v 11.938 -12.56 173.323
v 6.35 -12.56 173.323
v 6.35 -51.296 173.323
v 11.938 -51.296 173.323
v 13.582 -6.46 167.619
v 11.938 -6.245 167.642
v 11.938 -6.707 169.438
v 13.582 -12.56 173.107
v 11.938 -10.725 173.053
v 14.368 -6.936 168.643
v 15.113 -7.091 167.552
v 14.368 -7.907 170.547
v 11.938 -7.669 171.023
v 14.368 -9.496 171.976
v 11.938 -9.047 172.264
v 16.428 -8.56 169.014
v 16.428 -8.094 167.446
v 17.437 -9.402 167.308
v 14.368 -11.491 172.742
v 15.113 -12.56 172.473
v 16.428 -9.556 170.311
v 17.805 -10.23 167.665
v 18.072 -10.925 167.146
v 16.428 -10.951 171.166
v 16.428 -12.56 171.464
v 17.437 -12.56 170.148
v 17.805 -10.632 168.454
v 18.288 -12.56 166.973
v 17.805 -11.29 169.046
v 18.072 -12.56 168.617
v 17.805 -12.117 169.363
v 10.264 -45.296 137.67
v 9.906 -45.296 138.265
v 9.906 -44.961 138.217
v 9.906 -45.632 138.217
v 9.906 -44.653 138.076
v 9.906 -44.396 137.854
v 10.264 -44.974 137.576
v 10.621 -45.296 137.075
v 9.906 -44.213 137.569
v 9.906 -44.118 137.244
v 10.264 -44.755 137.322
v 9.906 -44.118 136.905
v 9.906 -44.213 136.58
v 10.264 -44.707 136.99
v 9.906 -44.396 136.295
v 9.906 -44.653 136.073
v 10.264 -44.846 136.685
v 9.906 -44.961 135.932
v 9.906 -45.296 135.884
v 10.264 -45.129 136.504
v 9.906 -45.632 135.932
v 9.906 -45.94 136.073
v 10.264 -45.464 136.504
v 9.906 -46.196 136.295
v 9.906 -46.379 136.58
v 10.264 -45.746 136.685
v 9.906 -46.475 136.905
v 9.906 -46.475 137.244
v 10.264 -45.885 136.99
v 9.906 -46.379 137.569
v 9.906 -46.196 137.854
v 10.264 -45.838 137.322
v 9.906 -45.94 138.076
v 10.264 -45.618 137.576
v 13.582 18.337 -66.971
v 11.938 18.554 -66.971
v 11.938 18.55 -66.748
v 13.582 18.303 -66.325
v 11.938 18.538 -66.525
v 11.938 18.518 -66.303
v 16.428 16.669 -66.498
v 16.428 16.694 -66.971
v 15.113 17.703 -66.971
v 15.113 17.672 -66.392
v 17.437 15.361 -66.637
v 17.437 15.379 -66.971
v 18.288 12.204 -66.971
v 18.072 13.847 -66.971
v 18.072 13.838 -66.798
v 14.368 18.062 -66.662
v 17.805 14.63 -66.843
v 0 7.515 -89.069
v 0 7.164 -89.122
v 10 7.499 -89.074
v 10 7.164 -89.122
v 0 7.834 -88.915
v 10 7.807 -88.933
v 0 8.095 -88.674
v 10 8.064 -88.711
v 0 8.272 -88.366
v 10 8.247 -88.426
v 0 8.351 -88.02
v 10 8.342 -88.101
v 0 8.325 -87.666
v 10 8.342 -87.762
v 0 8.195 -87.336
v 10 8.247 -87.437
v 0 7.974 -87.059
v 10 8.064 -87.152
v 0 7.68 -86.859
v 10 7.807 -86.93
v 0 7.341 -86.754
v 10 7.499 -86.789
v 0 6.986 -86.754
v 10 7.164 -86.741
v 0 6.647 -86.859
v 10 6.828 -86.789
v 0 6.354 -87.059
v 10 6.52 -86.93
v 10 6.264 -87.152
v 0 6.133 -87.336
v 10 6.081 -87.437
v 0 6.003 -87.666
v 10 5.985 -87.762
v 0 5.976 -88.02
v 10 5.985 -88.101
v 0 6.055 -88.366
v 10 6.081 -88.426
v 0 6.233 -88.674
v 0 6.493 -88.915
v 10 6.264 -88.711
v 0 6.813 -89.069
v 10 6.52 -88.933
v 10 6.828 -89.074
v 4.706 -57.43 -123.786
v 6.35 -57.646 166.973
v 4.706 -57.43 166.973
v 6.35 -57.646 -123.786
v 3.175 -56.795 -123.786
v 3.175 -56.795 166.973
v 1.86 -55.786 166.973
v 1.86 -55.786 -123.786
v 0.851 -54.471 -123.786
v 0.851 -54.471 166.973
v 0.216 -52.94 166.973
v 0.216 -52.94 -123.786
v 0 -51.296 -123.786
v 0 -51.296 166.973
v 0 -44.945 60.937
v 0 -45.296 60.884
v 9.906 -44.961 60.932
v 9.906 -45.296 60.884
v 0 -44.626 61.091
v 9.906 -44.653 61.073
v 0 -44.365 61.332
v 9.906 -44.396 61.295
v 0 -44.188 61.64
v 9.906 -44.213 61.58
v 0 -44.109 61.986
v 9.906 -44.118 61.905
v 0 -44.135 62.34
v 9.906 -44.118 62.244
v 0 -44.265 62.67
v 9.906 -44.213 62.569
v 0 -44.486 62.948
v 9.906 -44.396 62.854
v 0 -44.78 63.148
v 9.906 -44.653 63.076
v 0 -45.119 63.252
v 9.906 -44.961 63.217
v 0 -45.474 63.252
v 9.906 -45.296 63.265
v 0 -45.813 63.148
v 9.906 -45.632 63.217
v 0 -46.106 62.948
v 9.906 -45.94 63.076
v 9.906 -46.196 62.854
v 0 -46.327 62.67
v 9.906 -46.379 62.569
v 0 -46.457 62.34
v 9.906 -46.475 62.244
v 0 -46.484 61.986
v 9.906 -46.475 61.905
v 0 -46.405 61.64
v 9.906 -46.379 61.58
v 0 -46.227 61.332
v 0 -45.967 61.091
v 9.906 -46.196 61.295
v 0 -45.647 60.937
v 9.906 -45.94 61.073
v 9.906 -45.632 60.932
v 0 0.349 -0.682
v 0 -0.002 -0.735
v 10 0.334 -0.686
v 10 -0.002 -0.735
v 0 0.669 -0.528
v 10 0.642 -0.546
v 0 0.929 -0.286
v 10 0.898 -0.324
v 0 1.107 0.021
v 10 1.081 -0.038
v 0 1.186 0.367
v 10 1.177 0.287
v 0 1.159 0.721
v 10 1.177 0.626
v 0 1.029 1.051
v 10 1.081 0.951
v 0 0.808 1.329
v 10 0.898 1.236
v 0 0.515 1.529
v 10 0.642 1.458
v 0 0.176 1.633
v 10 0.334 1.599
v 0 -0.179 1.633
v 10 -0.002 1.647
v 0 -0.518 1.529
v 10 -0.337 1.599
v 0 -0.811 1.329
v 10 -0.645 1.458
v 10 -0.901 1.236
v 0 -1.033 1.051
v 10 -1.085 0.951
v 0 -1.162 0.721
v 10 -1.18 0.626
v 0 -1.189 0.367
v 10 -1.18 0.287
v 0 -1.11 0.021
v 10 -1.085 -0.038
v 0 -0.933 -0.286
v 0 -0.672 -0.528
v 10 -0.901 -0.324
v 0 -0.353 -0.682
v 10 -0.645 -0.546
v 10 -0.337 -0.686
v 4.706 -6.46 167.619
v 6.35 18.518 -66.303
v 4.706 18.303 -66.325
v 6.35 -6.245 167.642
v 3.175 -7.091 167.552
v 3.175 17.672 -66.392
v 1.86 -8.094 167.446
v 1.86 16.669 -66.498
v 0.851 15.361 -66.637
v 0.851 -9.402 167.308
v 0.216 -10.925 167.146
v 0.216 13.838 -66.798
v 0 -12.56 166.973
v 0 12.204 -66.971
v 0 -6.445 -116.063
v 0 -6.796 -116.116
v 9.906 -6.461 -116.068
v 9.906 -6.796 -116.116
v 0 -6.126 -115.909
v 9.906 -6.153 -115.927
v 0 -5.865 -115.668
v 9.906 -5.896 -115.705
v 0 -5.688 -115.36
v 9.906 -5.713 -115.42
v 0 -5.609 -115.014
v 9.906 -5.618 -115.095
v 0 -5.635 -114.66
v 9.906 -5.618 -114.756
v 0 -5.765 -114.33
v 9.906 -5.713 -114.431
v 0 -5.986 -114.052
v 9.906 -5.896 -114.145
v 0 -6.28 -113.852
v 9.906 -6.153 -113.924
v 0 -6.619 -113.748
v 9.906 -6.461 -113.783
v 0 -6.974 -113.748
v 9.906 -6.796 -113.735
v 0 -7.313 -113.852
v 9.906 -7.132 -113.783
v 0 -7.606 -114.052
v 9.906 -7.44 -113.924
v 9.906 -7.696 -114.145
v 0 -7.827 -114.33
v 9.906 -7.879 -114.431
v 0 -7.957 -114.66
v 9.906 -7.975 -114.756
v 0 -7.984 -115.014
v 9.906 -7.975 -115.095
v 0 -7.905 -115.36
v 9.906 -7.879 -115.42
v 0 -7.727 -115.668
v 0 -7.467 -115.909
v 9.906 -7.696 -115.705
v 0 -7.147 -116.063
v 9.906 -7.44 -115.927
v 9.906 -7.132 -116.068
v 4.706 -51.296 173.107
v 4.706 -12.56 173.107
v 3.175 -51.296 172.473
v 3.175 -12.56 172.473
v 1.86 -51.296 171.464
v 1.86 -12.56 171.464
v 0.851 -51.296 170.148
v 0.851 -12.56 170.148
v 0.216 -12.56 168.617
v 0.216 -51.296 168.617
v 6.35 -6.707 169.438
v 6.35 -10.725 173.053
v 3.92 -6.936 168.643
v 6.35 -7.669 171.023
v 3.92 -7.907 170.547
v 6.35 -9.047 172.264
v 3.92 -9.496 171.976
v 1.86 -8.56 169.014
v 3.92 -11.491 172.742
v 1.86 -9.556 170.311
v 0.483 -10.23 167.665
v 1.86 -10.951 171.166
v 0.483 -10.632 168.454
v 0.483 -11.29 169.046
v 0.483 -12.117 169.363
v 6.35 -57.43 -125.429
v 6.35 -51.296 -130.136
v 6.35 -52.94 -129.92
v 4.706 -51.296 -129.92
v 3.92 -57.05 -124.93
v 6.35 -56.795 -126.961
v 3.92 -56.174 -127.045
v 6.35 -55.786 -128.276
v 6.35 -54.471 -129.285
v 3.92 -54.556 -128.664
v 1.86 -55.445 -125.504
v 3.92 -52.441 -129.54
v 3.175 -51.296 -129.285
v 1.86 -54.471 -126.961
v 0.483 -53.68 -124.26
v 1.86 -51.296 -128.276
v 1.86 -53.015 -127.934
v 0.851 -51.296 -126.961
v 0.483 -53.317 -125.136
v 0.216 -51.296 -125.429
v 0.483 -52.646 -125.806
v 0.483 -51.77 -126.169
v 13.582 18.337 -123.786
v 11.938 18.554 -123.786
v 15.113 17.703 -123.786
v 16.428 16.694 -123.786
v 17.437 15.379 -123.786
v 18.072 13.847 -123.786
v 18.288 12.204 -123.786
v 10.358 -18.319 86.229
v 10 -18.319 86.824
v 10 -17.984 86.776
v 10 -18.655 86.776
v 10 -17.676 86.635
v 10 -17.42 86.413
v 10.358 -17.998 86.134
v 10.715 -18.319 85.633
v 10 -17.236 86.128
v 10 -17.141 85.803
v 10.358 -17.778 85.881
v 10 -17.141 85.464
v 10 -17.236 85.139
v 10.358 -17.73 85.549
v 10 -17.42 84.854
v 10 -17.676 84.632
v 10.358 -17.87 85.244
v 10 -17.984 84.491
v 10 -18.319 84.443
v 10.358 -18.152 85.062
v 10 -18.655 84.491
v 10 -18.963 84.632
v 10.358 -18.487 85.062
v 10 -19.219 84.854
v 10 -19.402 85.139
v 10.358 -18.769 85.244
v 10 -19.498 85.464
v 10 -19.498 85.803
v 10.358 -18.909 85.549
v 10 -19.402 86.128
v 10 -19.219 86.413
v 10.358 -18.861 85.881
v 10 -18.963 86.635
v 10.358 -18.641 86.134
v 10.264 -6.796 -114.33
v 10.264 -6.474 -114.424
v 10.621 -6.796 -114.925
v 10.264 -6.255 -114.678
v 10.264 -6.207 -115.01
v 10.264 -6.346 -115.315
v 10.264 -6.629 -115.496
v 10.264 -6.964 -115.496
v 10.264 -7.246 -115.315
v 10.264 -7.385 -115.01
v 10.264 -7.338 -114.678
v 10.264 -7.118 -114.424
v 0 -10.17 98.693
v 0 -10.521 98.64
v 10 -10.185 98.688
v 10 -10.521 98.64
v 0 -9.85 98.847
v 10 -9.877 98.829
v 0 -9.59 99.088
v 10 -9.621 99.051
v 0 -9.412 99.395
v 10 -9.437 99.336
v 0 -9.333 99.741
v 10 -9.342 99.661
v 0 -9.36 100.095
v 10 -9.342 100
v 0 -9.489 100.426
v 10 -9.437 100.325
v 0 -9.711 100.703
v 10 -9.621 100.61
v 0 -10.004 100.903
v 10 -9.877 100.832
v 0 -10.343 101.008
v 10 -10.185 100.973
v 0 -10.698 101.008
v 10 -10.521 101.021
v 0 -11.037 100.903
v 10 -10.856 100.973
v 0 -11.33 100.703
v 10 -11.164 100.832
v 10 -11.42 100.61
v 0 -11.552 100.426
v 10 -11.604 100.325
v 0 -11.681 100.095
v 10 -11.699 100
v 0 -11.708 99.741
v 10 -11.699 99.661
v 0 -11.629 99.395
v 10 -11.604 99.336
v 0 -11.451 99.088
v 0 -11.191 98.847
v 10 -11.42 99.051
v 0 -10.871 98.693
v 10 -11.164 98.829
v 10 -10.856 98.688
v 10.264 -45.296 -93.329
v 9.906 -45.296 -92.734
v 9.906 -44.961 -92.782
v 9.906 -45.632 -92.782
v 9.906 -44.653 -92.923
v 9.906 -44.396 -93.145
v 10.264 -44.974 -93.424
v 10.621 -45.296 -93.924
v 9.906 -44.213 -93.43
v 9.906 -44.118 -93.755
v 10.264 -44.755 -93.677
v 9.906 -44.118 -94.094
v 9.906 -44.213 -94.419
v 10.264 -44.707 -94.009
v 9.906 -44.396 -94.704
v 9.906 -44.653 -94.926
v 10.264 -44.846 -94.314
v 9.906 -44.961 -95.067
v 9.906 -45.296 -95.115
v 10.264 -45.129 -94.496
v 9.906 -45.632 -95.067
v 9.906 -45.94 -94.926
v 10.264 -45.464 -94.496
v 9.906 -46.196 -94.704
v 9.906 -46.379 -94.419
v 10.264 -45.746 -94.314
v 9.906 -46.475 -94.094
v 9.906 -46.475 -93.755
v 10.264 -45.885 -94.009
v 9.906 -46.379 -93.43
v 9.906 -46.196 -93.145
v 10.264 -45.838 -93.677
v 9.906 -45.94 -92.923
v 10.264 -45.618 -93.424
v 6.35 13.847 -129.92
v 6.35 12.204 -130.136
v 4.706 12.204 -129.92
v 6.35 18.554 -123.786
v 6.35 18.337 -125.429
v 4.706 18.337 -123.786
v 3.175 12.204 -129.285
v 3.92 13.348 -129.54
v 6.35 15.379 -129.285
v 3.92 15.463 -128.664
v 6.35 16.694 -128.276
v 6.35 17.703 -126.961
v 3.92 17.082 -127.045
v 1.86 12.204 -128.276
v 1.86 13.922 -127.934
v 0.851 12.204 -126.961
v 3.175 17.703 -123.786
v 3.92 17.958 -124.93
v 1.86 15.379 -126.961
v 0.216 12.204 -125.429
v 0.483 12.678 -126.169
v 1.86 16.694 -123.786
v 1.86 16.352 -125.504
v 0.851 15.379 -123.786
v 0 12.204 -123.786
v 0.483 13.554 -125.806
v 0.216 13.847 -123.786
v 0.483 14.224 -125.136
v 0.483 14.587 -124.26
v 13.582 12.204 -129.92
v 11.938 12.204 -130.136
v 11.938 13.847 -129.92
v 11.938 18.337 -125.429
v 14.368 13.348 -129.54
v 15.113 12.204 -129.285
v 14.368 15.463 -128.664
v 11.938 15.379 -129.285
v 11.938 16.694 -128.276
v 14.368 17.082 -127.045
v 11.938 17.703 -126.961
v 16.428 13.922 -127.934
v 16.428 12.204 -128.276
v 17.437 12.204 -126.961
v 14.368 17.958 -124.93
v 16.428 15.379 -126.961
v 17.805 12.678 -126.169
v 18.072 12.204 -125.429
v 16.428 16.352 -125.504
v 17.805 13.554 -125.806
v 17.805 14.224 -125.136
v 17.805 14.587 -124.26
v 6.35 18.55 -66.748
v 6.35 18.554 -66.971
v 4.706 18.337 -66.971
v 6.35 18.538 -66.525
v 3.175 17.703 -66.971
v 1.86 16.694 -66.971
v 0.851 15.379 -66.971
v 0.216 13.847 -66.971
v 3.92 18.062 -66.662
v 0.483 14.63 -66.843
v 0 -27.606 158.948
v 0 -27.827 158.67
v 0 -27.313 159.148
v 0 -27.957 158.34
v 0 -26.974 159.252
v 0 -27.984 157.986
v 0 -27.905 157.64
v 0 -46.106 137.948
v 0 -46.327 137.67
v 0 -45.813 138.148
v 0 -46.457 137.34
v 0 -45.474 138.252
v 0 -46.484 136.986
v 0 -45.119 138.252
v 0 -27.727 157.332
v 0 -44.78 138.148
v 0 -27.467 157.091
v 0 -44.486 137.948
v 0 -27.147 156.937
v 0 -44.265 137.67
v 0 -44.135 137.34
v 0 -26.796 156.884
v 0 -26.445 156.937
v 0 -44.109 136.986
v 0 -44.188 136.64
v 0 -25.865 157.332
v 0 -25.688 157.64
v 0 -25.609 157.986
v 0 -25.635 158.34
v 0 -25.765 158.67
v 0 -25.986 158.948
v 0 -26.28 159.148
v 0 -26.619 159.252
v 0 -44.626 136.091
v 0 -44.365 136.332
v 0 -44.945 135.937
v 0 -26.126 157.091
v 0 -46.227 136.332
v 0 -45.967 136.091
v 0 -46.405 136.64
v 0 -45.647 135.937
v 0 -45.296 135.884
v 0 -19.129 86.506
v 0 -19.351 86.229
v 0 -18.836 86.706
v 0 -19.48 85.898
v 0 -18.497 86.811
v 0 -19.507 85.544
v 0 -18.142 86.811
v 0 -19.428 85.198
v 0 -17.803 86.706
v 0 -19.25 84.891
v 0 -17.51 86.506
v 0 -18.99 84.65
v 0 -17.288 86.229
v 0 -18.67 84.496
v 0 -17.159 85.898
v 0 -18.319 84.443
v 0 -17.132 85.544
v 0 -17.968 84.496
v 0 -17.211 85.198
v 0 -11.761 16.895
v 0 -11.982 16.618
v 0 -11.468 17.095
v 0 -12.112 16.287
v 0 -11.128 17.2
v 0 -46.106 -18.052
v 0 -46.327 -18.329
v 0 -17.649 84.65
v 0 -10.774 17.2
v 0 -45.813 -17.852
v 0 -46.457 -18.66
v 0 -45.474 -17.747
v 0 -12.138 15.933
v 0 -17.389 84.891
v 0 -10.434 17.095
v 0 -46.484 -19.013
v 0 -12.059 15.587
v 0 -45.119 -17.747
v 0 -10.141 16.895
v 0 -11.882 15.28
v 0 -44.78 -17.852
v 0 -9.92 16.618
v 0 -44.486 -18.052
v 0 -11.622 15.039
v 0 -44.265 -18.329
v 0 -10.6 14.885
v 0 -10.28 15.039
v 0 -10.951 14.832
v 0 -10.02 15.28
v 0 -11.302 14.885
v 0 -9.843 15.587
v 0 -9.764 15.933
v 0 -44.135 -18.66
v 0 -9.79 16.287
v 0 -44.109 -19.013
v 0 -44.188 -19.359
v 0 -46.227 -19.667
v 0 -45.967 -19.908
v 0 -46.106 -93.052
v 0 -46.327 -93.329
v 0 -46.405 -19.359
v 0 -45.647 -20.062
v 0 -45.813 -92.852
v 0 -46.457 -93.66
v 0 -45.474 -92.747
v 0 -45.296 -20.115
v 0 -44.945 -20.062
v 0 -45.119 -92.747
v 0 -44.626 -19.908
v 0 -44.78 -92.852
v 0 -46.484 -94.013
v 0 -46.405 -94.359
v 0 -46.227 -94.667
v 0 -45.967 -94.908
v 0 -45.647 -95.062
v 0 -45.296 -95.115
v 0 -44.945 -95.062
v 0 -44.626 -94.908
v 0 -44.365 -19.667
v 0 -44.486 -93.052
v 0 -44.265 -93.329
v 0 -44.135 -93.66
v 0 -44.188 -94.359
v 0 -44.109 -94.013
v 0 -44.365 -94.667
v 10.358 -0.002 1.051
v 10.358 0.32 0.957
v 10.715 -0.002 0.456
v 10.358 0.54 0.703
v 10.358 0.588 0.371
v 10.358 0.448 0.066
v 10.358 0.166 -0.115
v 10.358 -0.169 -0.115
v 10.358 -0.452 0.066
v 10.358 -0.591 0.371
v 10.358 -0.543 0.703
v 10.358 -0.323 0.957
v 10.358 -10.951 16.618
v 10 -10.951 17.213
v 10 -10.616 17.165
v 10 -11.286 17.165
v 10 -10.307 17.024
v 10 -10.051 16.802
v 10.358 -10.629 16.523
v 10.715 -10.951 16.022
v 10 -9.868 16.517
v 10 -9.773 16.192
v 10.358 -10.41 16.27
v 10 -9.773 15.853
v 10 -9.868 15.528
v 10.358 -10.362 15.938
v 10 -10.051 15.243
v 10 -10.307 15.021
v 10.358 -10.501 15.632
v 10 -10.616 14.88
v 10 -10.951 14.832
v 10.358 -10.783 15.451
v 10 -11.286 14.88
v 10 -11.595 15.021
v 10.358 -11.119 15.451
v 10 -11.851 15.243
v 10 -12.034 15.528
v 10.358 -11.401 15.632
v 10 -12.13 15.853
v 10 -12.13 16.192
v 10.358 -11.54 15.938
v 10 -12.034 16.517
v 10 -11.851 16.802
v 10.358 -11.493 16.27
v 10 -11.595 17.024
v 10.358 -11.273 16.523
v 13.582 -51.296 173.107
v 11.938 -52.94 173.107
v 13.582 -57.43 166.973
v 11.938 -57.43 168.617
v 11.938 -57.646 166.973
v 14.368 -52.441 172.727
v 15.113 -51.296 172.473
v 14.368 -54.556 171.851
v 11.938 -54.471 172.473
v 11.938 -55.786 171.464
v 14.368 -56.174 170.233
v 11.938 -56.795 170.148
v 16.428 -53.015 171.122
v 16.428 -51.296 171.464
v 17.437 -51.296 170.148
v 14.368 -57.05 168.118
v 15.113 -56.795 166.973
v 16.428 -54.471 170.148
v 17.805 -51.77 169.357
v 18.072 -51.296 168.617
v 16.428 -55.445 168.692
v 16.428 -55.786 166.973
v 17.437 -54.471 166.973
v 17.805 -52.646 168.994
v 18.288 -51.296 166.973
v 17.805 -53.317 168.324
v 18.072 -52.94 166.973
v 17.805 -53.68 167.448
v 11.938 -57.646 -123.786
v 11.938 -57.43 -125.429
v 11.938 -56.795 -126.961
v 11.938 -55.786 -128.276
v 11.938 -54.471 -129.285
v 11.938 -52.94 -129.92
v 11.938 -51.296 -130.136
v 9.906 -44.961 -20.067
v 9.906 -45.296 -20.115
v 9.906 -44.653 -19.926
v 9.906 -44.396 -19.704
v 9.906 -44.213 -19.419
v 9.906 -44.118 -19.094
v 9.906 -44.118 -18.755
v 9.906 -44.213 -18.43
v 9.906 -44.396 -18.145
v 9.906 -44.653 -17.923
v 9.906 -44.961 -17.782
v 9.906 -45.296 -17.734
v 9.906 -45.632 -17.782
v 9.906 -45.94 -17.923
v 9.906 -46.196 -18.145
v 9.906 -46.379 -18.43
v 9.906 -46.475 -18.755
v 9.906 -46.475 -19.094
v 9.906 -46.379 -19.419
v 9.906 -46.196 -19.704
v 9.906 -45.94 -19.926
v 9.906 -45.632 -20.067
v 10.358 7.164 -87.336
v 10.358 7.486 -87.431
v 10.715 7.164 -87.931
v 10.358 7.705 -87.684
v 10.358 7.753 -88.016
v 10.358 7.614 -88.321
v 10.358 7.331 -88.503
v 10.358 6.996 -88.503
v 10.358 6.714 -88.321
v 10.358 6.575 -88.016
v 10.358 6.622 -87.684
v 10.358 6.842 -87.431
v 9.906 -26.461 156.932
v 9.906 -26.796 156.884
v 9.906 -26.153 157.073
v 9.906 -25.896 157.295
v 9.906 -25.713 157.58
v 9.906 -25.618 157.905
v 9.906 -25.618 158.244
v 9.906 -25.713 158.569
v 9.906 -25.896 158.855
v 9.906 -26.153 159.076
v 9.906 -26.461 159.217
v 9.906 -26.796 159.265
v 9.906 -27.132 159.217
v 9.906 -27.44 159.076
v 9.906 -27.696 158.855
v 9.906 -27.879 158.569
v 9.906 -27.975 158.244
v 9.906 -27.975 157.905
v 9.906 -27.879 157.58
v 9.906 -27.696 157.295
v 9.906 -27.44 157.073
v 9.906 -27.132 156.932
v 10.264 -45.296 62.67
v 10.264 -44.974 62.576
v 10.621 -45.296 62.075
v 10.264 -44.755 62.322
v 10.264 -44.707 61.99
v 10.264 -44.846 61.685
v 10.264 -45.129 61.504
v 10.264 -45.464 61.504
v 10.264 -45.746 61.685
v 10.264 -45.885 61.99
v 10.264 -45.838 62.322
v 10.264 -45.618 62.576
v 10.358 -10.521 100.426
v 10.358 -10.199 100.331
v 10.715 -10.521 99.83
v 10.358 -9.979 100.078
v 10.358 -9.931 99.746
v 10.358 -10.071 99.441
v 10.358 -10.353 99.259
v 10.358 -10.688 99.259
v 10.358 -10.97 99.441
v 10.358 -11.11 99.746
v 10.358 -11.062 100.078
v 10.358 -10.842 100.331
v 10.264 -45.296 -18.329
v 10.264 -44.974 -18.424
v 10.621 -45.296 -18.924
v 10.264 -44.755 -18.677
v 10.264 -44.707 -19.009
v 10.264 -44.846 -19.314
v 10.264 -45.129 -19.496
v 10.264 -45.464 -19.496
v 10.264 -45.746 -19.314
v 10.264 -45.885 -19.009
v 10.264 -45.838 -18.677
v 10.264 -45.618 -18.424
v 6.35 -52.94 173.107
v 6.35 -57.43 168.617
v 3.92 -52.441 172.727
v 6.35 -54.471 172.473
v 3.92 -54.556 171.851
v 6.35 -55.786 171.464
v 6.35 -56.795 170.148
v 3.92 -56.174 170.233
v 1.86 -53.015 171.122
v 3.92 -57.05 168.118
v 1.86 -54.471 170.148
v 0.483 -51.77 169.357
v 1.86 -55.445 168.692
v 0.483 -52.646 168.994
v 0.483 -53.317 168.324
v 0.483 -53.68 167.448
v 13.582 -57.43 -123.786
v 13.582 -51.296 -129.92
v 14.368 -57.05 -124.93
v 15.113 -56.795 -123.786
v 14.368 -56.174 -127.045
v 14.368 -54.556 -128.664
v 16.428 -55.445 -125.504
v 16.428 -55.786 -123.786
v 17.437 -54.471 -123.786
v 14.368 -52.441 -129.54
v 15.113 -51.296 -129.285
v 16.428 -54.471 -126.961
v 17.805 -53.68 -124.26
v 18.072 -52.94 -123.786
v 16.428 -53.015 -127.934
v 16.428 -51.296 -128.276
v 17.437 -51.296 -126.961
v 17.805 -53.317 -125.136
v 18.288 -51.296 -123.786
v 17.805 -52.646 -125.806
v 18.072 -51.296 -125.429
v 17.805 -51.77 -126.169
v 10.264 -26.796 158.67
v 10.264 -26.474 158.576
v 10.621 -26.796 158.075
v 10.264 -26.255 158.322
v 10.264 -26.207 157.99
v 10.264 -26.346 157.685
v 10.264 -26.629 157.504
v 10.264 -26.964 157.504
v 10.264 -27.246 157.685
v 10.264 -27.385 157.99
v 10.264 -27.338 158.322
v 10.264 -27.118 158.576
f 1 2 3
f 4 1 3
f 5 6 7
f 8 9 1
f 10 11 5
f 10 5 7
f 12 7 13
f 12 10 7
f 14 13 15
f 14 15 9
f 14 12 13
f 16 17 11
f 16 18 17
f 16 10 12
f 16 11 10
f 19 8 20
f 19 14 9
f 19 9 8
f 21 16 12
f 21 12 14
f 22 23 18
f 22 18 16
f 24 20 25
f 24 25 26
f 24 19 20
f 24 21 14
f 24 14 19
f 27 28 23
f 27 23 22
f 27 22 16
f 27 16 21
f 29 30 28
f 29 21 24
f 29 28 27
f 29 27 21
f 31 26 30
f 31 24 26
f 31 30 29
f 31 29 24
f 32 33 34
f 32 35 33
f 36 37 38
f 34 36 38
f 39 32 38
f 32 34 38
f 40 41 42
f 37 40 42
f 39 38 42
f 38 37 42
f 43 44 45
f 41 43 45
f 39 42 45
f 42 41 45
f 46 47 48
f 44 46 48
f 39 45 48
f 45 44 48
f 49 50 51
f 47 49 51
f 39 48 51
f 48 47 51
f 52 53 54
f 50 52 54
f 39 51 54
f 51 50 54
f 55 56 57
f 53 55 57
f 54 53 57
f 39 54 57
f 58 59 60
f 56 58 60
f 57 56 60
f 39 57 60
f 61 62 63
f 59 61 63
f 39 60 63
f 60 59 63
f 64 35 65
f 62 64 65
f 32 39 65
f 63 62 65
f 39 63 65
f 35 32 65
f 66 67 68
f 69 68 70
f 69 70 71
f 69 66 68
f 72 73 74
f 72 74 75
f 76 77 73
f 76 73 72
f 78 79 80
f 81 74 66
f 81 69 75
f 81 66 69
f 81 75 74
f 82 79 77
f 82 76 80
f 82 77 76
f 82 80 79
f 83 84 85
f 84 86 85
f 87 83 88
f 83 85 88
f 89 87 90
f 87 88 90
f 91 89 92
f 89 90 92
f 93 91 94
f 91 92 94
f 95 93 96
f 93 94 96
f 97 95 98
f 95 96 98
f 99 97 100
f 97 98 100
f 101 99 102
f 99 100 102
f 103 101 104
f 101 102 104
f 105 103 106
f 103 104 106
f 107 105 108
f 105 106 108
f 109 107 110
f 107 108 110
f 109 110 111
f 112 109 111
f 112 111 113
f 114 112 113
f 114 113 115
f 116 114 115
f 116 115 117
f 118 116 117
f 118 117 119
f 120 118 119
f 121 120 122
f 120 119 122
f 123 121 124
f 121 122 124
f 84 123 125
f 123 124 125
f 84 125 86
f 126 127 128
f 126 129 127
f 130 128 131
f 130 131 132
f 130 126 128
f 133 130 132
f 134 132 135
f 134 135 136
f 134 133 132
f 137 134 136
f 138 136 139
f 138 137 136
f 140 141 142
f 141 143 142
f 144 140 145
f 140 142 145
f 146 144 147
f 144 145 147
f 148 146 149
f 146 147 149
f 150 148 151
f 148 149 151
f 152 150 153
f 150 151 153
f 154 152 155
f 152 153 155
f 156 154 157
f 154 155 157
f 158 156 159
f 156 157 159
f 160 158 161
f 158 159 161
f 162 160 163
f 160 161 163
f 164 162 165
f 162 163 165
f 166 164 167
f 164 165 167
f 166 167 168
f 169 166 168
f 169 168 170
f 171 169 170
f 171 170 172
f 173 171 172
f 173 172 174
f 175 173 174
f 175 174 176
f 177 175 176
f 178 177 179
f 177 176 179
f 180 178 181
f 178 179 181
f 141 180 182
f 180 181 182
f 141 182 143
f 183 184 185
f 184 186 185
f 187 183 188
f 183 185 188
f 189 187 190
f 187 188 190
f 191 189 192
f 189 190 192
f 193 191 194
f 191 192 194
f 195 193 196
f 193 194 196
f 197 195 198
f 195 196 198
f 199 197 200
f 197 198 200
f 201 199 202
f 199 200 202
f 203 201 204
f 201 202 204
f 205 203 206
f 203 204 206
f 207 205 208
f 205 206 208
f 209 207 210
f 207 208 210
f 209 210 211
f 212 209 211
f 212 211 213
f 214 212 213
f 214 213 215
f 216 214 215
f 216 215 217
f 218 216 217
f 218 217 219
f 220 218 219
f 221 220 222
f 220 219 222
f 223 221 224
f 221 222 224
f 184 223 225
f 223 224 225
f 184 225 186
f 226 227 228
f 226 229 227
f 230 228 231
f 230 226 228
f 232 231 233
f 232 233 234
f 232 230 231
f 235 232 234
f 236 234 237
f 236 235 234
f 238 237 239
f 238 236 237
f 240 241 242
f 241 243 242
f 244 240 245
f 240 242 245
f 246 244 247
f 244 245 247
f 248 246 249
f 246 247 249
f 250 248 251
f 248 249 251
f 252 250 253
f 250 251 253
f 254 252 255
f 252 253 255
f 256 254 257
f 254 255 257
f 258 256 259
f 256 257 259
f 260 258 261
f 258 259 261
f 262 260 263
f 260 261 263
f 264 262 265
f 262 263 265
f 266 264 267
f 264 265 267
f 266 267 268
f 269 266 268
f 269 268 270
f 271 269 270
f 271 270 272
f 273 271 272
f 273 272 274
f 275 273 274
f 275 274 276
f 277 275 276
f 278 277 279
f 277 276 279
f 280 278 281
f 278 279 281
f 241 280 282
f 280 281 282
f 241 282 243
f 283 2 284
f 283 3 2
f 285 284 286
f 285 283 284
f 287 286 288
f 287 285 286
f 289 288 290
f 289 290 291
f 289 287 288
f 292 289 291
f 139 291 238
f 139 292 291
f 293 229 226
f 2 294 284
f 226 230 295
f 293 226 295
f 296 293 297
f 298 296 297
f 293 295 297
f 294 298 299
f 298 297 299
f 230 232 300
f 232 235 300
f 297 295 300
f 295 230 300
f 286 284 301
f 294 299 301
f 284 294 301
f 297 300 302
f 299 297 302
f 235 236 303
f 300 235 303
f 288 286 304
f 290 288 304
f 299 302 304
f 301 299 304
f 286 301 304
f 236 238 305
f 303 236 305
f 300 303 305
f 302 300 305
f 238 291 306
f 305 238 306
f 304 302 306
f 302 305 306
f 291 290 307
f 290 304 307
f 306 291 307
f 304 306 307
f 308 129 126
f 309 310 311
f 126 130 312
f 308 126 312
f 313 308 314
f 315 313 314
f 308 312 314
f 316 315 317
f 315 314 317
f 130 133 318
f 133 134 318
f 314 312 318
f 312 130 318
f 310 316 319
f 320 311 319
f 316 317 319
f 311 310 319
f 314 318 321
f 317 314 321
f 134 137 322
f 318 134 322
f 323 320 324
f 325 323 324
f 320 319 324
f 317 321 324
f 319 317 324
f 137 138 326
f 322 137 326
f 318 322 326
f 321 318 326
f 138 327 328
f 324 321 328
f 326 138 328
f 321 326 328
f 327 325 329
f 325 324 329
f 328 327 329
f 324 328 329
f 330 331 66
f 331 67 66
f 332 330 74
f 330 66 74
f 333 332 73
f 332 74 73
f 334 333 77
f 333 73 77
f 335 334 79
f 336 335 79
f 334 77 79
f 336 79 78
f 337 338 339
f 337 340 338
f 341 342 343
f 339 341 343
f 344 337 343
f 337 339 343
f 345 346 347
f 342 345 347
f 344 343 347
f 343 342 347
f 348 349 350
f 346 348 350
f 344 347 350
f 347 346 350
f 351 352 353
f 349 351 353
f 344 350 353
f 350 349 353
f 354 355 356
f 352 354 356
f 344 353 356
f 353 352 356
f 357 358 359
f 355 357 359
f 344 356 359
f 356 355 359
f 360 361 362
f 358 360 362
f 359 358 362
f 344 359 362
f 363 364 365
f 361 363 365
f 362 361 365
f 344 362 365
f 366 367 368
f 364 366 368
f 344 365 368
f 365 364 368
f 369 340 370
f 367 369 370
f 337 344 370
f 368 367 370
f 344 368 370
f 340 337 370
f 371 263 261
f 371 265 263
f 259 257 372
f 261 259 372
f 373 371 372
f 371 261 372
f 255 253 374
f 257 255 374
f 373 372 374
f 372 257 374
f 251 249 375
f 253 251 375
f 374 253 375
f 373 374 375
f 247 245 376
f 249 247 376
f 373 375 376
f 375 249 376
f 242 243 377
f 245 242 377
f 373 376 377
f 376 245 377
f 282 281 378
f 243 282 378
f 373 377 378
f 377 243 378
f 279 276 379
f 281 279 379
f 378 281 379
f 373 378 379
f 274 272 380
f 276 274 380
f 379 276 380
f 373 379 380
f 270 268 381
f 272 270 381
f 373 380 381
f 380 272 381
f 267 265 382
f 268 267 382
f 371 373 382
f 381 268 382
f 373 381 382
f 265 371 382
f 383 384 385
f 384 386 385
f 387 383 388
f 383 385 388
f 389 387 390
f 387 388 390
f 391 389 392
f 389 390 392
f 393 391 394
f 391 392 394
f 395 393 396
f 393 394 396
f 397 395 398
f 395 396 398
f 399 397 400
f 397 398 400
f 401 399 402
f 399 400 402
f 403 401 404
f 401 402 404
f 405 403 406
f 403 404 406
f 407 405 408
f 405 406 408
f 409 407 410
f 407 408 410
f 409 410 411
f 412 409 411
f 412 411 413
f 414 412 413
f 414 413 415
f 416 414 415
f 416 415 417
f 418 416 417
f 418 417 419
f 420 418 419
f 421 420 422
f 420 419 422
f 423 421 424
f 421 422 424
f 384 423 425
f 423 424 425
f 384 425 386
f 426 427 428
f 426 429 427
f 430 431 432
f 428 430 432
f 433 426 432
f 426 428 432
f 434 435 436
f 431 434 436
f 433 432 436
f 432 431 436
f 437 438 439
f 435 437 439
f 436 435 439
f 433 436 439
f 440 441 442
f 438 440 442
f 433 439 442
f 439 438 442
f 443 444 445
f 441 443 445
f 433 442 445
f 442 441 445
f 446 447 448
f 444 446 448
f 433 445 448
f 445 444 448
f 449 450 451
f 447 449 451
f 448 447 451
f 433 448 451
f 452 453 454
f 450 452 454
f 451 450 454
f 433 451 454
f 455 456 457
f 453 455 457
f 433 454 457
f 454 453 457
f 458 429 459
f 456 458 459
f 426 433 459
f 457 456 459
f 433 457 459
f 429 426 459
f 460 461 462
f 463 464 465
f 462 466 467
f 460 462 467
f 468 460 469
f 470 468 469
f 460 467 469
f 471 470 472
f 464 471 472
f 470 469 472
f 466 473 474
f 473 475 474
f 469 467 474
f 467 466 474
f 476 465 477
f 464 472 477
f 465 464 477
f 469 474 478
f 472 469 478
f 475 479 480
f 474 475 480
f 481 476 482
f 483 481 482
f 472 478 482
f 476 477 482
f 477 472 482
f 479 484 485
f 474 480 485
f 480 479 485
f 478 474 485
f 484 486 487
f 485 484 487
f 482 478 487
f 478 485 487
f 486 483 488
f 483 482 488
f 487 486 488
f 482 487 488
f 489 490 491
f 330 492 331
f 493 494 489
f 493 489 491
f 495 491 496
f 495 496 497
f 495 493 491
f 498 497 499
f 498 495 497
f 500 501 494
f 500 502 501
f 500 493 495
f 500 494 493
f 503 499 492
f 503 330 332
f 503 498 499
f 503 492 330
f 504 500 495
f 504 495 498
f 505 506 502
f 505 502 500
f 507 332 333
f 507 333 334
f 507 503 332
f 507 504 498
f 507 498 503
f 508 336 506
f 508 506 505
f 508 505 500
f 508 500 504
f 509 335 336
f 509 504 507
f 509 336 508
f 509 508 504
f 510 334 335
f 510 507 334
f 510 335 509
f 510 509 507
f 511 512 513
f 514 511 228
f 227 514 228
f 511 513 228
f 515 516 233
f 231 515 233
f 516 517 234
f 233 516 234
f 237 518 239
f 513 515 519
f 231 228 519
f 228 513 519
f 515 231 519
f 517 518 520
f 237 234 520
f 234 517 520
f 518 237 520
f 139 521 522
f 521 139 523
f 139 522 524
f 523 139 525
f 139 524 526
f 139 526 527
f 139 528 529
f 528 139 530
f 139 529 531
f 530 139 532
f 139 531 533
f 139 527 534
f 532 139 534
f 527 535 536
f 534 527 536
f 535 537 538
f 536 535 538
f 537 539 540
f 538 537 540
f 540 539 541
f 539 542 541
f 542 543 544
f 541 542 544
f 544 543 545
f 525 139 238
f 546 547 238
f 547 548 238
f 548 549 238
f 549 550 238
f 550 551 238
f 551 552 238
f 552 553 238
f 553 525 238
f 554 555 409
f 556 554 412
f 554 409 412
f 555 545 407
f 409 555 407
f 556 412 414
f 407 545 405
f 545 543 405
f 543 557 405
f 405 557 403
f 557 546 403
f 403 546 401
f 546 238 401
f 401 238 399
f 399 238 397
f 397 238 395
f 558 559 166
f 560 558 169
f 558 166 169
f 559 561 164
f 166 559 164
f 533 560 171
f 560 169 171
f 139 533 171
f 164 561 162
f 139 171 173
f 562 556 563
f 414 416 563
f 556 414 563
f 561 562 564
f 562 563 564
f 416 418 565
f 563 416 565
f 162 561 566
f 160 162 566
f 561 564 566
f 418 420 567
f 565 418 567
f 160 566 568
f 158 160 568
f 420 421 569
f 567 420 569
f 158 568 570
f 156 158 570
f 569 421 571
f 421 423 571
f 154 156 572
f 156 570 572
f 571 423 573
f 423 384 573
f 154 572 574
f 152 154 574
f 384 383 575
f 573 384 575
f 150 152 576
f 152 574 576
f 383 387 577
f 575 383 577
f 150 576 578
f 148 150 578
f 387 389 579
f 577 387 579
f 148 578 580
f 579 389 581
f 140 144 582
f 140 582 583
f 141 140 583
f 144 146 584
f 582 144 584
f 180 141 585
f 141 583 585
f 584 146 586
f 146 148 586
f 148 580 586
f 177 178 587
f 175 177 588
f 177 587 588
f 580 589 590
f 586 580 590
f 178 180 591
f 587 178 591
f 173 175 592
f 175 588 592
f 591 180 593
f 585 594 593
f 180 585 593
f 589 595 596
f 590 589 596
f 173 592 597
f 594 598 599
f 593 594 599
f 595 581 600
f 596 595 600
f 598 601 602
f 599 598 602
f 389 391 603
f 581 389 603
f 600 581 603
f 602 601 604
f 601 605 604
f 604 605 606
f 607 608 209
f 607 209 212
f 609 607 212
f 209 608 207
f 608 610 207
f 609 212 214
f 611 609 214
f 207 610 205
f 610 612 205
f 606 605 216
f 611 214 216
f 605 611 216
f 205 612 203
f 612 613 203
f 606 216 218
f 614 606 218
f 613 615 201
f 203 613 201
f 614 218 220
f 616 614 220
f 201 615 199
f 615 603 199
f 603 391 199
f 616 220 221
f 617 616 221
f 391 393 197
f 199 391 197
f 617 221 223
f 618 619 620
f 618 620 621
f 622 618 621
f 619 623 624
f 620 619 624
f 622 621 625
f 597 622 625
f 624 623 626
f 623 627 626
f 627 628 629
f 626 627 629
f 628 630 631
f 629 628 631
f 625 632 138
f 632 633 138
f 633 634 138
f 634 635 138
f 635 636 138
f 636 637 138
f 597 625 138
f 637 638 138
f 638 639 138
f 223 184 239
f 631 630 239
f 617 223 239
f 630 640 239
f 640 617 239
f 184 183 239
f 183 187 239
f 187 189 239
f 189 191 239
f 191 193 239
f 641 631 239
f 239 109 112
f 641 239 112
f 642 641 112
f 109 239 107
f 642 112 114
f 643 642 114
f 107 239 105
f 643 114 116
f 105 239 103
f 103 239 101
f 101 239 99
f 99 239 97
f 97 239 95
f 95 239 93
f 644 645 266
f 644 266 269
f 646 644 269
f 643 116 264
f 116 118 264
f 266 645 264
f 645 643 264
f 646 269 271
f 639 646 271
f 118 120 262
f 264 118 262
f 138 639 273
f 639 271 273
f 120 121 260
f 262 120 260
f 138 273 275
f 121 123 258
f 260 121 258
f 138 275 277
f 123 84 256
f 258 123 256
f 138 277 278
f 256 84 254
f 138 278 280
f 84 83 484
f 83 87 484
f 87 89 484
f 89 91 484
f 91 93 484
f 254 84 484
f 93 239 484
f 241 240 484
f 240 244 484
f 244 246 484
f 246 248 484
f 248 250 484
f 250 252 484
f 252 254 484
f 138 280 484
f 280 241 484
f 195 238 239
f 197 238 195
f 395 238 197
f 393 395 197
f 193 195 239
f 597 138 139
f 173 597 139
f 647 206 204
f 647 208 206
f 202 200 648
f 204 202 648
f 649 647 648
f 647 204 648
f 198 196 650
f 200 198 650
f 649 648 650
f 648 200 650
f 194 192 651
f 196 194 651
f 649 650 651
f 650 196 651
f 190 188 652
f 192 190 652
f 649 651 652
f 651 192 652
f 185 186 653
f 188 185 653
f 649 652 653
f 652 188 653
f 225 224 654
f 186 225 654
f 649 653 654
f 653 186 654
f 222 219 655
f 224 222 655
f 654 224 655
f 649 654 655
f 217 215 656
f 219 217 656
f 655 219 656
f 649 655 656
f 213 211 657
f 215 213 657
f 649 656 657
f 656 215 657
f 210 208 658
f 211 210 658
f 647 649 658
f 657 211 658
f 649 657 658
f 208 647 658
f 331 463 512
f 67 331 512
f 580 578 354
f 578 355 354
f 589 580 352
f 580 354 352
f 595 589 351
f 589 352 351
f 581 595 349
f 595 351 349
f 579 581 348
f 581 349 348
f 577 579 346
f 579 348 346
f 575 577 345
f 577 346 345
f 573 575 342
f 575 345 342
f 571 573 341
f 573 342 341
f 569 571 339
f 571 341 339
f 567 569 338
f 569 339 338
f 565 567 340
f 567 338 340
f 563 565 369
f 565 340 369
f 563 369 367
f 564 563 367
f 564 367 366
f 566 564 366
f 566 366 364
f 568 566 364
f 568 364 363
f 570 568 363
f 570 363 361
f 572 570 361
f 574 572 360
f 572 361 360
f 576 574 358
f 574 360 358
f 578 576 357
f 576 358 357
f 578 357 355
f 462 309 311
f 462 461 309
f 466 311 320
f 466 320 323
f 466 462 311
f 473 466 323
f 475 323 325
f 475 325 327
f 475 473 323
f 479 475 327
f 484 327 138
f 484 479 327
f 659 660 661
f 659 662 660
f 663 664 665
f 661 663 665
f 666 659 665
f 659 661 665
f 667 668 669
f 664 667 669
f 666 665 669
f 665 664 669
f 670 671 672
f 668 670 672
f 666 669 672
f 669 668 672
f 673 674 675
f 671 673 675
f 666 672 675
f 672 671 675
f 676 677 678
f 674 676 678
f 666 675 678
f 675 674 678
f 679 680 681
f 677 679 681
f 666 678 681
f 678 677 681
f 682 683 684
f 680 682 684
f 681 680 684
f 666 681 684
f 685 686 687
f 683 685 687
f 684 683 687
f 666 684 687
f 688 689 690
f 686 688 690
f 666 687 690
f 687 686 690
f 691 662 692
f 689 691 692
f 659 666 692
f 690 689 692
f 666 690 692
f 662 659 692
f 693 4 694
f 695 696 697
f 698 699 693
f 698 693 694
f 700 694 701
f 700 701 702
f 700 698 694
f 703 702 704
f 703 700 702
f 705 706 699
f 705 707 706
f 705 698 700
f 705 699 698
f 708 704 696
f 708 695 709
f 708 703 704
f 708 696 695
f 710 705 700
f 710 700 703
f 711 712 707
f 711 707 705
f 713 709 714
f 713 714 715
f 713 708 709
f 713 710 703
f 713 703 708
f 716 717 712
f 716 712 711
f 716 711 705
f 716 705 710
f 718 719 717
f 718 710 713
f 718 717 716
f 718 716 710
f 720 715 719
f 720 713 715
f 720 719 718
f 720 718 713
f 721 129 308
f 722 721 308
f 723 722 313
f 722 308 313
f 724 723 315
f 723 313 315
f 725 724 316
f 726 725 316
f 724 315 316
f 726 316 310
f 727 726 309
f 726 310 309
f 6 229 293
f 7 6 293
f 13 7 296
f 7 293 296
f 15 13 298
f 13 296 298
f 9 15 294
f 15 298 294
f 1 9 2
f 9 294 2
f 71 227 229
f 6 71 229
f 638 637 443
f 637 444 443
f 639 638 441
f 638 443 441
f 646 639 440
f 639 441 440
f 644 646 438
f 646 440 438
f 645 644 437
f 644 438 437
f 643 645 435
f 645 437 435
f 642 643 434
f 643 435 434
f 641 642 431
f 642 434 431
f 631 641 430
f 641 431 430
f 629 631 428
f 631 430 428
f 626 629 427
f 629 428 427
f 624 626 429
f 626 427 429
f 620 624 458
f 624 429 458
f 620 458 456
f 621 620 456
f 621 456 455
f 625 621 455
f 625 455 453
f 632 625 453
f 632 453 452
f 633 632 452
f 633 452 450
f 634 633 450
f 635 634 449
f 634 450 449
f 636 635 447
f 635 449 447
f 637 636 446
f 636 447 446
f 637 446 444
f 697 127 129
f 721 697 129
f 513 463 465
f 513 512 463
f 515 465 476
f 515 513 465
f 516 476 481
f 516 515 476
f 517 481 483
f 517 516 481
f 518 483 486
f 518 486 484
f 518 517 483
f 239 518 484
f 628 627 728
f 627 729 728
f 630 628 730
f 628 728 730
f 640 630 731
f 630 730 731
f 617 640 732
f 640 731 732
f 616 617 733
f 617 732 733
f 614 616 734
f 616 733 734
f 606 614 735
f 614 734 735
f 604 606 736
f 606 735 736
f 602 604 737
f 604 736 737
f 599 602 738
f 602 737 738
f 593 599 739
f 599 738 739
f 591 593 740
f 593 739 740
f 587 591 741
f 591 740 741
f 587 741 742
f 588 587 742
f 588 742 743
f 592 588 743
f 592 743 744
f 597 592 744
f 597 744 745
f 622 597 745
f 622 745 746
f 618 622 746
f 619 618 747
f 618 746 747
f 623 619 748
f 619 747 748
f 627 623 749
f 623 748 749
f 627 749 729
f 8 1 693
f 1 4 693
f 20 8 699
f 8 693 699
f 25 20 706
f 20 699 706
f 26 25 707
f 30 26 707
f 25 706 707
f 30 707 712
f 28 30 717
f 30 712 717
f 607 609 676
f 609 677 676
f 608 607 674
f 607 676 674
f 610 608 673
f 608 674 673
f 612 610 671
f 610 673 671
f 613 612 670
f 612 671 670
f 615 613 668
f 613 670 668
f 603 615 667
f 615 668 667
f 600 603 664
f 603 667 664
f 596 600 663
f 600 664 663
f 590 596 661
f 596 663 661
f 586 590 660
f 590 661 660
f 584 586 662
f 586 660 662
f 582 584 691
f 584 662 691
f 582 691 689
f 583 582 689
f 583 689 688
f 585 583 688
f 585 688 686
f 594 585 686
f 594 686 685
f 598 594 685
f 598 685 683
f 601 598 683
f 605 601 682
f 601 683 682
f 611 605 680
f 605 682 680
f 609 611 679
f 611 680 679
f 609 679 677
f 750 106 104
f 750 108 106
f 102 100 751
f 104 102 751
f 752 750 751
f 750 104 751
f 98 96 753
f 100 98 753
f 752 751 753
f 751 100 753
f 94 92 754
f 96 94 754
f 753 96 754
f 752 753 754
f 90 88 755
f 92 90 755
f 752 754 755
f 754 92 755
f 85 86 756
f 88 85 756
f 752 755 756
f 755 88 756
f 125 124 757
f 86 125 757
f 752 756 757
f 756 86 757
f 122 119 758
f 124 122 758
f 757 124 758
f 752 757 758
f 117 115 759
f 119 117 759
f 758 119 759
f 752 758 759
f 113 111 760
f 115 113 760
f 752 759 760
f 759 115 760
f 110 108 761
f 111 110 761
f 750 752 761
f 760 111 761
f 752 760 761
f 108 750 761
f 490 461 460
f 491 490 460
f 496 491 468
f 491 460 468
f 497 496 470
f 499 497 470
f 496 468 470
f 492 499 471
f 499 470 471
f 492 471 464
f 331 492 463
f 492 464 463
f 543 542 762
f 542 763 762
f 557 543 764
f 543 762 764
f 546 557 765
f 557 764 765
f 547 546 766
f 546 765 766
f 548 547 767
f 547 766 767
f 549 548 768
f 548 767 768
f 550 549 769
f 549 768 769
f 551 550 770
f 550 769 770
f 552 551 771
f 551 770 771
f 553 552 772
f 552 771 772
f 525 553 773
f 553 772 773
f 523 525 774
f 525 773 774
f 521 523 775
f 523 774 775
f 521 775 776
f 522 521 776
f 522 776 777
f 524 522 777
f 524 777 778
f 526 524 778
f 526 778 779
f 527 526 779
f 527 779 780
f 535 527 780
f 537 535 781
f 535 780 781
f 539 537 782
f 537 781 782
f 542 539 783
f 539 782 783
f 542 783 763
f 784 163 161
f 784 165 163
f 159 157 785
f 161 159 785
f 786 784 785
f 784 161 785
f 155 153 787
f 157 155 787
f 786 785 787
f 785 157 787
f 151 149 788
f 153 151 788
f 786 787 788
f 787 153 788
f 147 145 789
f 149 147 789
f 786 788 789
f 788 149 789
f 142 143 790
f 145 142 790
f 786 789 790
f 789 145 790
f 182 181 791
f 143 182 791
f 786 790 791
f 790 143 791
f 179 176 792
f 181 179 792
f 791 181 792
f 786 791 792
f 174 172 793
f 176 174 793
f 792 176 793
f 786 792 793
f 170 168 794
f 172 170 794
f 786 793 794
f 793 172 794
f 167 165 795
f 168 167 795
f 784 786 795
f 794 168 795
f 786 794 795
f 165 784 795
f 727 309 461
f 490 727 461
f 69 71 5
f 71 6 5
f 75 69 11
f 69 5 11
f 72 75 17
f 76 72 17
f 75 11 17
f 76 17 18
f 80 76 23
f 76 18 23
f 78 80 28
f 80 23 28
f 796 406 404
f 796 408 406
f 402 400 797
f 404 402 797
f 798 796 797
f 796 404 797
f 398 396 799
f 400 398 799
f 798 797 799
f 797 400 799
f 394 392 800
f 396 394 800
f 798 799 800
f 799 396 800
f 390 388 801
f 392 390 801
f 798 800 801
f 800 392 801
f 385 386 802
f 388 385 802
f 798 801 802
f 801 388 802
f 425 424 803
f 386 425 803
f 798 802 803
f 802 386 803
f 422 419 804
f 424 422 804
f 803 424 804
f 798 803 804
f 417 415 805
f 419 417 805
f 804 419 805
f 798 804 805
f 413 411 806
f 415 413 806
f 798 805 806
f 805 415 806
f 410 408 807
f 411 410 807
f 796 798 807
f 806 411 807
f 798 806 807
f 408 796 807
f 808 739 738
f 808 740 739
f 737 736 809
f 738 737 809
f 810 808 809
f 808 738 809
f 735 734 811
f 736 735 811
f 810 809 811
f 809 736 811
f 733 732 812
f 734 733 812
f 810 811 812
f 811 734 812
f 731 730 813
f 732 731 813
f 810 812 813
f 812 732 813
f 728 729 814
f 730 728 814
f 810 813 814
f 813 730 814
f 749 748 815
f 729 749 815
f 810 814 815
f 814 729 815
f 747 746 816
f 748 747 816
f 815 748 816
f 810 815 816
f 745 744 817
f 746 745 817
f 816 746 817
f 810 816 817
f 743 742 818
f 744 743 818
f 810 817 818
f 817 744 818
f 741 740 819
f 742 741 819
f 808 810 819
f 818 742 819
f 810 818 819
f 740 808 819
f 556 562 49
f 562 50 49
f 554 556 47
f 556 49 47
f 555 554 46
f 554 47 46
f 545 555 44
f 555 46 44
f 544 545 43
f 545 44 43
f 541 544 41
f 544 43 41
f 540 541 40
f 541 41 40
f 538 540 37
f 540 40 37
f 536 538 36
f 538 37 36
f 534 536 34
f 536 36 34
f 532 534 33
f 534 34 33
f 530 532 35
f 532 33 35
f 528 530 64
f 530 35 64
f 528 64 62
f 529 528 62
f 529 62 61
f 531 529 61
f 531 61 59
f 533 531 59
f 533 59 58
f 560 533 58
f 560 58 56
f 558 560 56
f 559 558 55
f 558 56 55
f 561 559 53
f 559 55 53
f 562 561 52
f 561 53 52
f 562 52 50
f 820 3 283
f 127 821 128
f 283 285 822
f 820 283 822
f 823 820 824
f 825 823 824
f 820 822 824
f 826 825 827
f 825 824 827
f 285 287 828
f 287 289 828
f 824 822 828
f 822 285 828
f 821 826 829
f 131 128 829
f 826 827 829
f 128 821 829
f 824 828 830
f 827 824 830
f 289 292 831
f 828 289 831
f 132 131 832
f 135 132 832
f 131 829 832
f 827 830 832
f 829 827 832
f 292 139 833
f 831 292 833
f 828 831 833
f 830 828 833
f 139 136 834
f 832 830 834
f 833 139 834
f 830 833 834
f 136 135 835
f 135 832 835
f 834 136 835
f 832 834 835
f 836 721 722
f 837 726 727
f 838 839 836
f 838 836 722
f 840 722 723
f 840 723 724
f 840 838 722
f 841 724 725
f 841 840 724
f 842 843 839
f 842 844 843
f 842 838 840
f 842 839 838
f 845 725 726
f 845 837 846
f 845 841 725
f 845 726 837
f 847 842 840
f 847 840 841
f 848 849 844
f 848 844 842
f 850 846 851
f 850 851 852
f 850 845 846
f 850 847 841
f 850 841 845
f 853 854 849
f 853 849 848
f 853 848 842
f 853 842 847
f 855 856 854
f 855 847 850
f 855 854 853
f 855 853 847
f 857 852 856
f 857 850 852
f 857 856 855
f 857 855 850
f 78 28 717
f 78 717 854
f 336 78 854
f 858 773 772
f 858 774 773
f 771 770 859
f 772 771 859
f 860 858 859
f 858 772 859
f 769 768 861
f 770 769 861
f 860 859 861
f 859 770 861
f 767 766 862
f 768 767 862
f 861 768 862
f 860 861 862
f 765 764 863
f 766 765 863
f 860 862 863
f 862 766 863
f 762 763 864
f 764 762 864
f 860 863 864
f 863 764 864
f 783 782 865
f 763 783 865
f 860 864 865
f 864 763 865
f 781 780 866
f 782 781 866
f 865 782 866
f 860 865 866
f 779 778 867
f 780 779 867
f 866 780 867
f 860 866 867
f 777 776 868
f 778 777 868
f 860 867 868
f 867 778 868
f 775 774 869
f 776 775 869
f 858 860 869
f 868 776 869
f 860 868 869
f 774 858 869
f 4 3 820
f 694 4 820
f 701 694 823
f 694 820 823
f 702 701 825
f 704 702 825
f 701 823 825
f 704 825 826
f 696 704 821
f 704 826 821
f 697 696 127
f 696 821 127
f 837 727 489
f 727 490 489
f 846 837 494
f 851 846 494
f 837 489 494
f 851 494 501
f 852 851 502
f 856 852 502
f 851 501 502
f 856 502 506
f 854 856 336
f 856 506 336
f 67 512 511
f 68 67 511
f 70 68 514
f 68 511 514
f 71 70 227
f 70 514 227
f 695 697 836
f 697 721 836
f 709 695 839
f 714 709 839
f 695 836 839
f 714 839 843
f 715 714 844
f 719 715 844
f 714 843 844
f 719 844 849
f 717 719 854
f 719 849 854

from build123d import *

# Parameters (mm, degrees)
BOSS_EXTRUDE1_DEPTH                 = 18.288
FILLET1_R                           = 6.35
F_3_32_0_09375_DIAMETER_HOLE2_D     = 2.38125
F_3_32_0_09375_DIAMETER_HOLE2_DEPTH = 10.0000054
F_3_32_0_09375_DIAMETER_HOLE2_TIP   = 0.715399675
F_3_32_0_09375_DIAMETER_HOLE3_D     = 2.38125
F_3_32_0_09375_DIAMETER_HOLE3_DEPTH = 9.906
F_3_32_0_09375_DIAMETER_HOLE3_TIP   = 0.715399675
F_3_32_0_09375_DIAMETER_HOLE4_D     = 2.38125
F_3_32_0_09375_DIAMETER_HOLE4_DEPTH = 9.906
F_3_32_0_09375_DIAMETER_HOLE4_TIP   = 0.715399675
F_3_32_0_09375_DIAMETER_HOLE5_D     = 2.38125
F_3_32_0_09375_DIAMETER_HOLE5_DEPTH = 10.0000054
F_3_32_0_09375_DIAMETER_HOLE5_TIP   = 0.715399675


with BuildPart() as part:
    # Sketch1 → Boss-Extrude1 (new body)
    with BuildSketch(Plane(origin=(0, 0, 0), x_dir=(0, 0, -1), z_dir=(1, 0, 0))):
        with BuildLine():
            Line((-166.973473818, -57.646230654), (123.785960254, -57.646230654))
            ThreePointArc((123.785960254, -57.646230654), (128.276088314, -55.786358715), (130.135960254, -51.296230654))
            Line((130.135960254, -51.296230654), (130.135960254, 12.203769346))
            ThreePointArc((130.135960254, 12.203769346), (128.276088314, 16.693897406), (123.785960254, 18.553769346))
            Line((123.785960254, 18.553769346), (66.971101736, 18.553769346))
            ThreePointArc((66.971101736, 18.553769346), (66.636426055, 18.5449437), (66.302680683, 18.518491295))
            Line((66.302680683, 18.518491295), (-167.641894871, -6.244828564))
            ThreePointArc((-167.641894871, -6.244828564), (-171.694012648, -8.31231457), (-173.323473818, -12.559550513))
            Line((-173.323473818, -12.559550513), (-173.323473818, -51.296230654))
            ThreePointArc((-173.323473818, -51.296230654), (-171.463601879, -55.786358715), (-166.973473818, -57.646230654))
        make_face()
    extrude(amount=BOSS_EXTRUDE1_DEPTH)

    # Fillet1
    fillet1_edges = [part.edges().sort_by_distance(p)[0] for p in [
        (18.288, -8.31231457, 171.694012648),
        (0, -19.546230654, -130.135960254),
        (0, -55.786358715, -128.276088314),
        (0, -57.646230654, 21.593756782),
        (0, -55.786358715, 171.463601879),
        (0, -31.927890584, 173.323473818),
        (0, -8.31231457, 171.694012648),
        (0, 6.136831366, 50.669607094),
        (0, 18.5449437, -66.636426055),
        (18.288, -31.927890584, 173.323473818),
        (18.288, -55.786358715, 171.463601879),
        (18.288, -57.646230654, 21.593756782),
        (18.288, -55.786358715, -128.276088314),
        (18.288, -19.546230654, -130.135960254),
        (18.288, 16.693897406, -128.276088314),
        (18.288, 18.553769346, -95.378530995),
        (18.288, 18.5449437, -66.636426055),
        (18.288, 6.136831366, 50.669607094),
        (0, 18.553769346, -95.378530995),
        (0, 16.693897406, -128.276088314),
    ]]
    fillet(fillet1_edges, radius=FILLET1_R)

    # 3/32 (0.09375) Diameter Hole2
    with Locations(Plane.ZY):
        with Locations((16.022312628, -10.951018239), (85.63342073, -18.319439291)):
            Hole(F_3_32_0_09375_DIAMETER_HOLE2_D / 2, depth=F_3_32_0_09375_DIAMETER_HOLE2_DEPTH)
            with Locations((0, 0, -(F_3_32_0_09375_DIAMETER_HOLE2_DEPTH + F_3_32_0_09375_DIAMETER_HOLE2_TIP / 2))):  # 118° drill point
                Cone(0, F_3_32_0_09375_DIAMETER_HOLE2_D / 2, F_3_32_0_09375_DIAMETER_HOLE2_TIP, mode=Mode.SUBTRACT)

    # 3/32 (0.09375) Diameter Hole3
    with Locations(Plane.ZY):
        with Locations((158.074809607, -26.796230654), (-114.925190393, -6.796230654)):
            Hole(F_3_32_0_09375_DIAMETER_HOLE3_D / 2, depth=F_3_32_0_09375_DIAMETER_HOLE3_DEPTH)
            with Locations((0, 0, -(F_3_32_0_09375_DIAMETER_HOLE3_DEPTH + F_3_32_0_09375_DIAMETER_HOLE3_TIP / 2))):  # 118° drill point
                Cone(0, F_3_32_0_09375_DIAMETER_HOLE3_D / 2, F_3_32_0_09375_DIAMETER_HOLE3_TIP, mode=Mode.SUBTRACT)

    # 3/32 (0.09375) Diameter Hole4
    with Locations(Plane.ZY):
        with Locations((-93.924468997, -45.296232872), (-18.924468997, -45.296232872), (62.074800328, -45.296232872), (137.074800328, -45.296232872)):
            Hole(F_3_32_0_09375_DIAMETER_HOLE4_D / 2, depth=F_3_32_0_09375_DIAMETER_HOLE4_DEPTH)
            with Locations((0, 0, -(F_3_32_0_09375_DIAMETER_HOLE4_DEPTH + F_3_32_0_09375_DIAMETER_HOLE4_TIP / 2))):  # 118° drill point
                Cone(0, F_3_32_0_09375_DIAMETER_HOLE4_D / 2, F_3_32_0_09375_DIAMETER_HOLE4_TIP, mode=Mode.SUBTRACT)

    # 3/32 (0.09375) Diameter Hole5
    with Locations(Plane.ZY):
        with Locations((-87.93134055, 7.163769346), (0.456111434, -0.001640397), (99.83035199, -10.520525474)):
            Hole(F_3_32_0_09375_DIAMETER_HOLE5_D / 2, depth=F_3_32_0_09375_DIAMETER_HOLE5_DEPTH)
            with Locations((0, 0, -(F_3_32_0_09375_DIAMETER_HOLE5_DEPTH + F_3_32_0_09375_DIAMETER_HOLE5_TIP / 2))):  # 118° drill point
                Cone(0, F_3_32_0_09375_DIAMETER_HOLE5_D / 2, F_3_32_0_09375_DIAMETER_HOLE5_TIP, mode=Mode.SUBTRACT)


solid = part.part
